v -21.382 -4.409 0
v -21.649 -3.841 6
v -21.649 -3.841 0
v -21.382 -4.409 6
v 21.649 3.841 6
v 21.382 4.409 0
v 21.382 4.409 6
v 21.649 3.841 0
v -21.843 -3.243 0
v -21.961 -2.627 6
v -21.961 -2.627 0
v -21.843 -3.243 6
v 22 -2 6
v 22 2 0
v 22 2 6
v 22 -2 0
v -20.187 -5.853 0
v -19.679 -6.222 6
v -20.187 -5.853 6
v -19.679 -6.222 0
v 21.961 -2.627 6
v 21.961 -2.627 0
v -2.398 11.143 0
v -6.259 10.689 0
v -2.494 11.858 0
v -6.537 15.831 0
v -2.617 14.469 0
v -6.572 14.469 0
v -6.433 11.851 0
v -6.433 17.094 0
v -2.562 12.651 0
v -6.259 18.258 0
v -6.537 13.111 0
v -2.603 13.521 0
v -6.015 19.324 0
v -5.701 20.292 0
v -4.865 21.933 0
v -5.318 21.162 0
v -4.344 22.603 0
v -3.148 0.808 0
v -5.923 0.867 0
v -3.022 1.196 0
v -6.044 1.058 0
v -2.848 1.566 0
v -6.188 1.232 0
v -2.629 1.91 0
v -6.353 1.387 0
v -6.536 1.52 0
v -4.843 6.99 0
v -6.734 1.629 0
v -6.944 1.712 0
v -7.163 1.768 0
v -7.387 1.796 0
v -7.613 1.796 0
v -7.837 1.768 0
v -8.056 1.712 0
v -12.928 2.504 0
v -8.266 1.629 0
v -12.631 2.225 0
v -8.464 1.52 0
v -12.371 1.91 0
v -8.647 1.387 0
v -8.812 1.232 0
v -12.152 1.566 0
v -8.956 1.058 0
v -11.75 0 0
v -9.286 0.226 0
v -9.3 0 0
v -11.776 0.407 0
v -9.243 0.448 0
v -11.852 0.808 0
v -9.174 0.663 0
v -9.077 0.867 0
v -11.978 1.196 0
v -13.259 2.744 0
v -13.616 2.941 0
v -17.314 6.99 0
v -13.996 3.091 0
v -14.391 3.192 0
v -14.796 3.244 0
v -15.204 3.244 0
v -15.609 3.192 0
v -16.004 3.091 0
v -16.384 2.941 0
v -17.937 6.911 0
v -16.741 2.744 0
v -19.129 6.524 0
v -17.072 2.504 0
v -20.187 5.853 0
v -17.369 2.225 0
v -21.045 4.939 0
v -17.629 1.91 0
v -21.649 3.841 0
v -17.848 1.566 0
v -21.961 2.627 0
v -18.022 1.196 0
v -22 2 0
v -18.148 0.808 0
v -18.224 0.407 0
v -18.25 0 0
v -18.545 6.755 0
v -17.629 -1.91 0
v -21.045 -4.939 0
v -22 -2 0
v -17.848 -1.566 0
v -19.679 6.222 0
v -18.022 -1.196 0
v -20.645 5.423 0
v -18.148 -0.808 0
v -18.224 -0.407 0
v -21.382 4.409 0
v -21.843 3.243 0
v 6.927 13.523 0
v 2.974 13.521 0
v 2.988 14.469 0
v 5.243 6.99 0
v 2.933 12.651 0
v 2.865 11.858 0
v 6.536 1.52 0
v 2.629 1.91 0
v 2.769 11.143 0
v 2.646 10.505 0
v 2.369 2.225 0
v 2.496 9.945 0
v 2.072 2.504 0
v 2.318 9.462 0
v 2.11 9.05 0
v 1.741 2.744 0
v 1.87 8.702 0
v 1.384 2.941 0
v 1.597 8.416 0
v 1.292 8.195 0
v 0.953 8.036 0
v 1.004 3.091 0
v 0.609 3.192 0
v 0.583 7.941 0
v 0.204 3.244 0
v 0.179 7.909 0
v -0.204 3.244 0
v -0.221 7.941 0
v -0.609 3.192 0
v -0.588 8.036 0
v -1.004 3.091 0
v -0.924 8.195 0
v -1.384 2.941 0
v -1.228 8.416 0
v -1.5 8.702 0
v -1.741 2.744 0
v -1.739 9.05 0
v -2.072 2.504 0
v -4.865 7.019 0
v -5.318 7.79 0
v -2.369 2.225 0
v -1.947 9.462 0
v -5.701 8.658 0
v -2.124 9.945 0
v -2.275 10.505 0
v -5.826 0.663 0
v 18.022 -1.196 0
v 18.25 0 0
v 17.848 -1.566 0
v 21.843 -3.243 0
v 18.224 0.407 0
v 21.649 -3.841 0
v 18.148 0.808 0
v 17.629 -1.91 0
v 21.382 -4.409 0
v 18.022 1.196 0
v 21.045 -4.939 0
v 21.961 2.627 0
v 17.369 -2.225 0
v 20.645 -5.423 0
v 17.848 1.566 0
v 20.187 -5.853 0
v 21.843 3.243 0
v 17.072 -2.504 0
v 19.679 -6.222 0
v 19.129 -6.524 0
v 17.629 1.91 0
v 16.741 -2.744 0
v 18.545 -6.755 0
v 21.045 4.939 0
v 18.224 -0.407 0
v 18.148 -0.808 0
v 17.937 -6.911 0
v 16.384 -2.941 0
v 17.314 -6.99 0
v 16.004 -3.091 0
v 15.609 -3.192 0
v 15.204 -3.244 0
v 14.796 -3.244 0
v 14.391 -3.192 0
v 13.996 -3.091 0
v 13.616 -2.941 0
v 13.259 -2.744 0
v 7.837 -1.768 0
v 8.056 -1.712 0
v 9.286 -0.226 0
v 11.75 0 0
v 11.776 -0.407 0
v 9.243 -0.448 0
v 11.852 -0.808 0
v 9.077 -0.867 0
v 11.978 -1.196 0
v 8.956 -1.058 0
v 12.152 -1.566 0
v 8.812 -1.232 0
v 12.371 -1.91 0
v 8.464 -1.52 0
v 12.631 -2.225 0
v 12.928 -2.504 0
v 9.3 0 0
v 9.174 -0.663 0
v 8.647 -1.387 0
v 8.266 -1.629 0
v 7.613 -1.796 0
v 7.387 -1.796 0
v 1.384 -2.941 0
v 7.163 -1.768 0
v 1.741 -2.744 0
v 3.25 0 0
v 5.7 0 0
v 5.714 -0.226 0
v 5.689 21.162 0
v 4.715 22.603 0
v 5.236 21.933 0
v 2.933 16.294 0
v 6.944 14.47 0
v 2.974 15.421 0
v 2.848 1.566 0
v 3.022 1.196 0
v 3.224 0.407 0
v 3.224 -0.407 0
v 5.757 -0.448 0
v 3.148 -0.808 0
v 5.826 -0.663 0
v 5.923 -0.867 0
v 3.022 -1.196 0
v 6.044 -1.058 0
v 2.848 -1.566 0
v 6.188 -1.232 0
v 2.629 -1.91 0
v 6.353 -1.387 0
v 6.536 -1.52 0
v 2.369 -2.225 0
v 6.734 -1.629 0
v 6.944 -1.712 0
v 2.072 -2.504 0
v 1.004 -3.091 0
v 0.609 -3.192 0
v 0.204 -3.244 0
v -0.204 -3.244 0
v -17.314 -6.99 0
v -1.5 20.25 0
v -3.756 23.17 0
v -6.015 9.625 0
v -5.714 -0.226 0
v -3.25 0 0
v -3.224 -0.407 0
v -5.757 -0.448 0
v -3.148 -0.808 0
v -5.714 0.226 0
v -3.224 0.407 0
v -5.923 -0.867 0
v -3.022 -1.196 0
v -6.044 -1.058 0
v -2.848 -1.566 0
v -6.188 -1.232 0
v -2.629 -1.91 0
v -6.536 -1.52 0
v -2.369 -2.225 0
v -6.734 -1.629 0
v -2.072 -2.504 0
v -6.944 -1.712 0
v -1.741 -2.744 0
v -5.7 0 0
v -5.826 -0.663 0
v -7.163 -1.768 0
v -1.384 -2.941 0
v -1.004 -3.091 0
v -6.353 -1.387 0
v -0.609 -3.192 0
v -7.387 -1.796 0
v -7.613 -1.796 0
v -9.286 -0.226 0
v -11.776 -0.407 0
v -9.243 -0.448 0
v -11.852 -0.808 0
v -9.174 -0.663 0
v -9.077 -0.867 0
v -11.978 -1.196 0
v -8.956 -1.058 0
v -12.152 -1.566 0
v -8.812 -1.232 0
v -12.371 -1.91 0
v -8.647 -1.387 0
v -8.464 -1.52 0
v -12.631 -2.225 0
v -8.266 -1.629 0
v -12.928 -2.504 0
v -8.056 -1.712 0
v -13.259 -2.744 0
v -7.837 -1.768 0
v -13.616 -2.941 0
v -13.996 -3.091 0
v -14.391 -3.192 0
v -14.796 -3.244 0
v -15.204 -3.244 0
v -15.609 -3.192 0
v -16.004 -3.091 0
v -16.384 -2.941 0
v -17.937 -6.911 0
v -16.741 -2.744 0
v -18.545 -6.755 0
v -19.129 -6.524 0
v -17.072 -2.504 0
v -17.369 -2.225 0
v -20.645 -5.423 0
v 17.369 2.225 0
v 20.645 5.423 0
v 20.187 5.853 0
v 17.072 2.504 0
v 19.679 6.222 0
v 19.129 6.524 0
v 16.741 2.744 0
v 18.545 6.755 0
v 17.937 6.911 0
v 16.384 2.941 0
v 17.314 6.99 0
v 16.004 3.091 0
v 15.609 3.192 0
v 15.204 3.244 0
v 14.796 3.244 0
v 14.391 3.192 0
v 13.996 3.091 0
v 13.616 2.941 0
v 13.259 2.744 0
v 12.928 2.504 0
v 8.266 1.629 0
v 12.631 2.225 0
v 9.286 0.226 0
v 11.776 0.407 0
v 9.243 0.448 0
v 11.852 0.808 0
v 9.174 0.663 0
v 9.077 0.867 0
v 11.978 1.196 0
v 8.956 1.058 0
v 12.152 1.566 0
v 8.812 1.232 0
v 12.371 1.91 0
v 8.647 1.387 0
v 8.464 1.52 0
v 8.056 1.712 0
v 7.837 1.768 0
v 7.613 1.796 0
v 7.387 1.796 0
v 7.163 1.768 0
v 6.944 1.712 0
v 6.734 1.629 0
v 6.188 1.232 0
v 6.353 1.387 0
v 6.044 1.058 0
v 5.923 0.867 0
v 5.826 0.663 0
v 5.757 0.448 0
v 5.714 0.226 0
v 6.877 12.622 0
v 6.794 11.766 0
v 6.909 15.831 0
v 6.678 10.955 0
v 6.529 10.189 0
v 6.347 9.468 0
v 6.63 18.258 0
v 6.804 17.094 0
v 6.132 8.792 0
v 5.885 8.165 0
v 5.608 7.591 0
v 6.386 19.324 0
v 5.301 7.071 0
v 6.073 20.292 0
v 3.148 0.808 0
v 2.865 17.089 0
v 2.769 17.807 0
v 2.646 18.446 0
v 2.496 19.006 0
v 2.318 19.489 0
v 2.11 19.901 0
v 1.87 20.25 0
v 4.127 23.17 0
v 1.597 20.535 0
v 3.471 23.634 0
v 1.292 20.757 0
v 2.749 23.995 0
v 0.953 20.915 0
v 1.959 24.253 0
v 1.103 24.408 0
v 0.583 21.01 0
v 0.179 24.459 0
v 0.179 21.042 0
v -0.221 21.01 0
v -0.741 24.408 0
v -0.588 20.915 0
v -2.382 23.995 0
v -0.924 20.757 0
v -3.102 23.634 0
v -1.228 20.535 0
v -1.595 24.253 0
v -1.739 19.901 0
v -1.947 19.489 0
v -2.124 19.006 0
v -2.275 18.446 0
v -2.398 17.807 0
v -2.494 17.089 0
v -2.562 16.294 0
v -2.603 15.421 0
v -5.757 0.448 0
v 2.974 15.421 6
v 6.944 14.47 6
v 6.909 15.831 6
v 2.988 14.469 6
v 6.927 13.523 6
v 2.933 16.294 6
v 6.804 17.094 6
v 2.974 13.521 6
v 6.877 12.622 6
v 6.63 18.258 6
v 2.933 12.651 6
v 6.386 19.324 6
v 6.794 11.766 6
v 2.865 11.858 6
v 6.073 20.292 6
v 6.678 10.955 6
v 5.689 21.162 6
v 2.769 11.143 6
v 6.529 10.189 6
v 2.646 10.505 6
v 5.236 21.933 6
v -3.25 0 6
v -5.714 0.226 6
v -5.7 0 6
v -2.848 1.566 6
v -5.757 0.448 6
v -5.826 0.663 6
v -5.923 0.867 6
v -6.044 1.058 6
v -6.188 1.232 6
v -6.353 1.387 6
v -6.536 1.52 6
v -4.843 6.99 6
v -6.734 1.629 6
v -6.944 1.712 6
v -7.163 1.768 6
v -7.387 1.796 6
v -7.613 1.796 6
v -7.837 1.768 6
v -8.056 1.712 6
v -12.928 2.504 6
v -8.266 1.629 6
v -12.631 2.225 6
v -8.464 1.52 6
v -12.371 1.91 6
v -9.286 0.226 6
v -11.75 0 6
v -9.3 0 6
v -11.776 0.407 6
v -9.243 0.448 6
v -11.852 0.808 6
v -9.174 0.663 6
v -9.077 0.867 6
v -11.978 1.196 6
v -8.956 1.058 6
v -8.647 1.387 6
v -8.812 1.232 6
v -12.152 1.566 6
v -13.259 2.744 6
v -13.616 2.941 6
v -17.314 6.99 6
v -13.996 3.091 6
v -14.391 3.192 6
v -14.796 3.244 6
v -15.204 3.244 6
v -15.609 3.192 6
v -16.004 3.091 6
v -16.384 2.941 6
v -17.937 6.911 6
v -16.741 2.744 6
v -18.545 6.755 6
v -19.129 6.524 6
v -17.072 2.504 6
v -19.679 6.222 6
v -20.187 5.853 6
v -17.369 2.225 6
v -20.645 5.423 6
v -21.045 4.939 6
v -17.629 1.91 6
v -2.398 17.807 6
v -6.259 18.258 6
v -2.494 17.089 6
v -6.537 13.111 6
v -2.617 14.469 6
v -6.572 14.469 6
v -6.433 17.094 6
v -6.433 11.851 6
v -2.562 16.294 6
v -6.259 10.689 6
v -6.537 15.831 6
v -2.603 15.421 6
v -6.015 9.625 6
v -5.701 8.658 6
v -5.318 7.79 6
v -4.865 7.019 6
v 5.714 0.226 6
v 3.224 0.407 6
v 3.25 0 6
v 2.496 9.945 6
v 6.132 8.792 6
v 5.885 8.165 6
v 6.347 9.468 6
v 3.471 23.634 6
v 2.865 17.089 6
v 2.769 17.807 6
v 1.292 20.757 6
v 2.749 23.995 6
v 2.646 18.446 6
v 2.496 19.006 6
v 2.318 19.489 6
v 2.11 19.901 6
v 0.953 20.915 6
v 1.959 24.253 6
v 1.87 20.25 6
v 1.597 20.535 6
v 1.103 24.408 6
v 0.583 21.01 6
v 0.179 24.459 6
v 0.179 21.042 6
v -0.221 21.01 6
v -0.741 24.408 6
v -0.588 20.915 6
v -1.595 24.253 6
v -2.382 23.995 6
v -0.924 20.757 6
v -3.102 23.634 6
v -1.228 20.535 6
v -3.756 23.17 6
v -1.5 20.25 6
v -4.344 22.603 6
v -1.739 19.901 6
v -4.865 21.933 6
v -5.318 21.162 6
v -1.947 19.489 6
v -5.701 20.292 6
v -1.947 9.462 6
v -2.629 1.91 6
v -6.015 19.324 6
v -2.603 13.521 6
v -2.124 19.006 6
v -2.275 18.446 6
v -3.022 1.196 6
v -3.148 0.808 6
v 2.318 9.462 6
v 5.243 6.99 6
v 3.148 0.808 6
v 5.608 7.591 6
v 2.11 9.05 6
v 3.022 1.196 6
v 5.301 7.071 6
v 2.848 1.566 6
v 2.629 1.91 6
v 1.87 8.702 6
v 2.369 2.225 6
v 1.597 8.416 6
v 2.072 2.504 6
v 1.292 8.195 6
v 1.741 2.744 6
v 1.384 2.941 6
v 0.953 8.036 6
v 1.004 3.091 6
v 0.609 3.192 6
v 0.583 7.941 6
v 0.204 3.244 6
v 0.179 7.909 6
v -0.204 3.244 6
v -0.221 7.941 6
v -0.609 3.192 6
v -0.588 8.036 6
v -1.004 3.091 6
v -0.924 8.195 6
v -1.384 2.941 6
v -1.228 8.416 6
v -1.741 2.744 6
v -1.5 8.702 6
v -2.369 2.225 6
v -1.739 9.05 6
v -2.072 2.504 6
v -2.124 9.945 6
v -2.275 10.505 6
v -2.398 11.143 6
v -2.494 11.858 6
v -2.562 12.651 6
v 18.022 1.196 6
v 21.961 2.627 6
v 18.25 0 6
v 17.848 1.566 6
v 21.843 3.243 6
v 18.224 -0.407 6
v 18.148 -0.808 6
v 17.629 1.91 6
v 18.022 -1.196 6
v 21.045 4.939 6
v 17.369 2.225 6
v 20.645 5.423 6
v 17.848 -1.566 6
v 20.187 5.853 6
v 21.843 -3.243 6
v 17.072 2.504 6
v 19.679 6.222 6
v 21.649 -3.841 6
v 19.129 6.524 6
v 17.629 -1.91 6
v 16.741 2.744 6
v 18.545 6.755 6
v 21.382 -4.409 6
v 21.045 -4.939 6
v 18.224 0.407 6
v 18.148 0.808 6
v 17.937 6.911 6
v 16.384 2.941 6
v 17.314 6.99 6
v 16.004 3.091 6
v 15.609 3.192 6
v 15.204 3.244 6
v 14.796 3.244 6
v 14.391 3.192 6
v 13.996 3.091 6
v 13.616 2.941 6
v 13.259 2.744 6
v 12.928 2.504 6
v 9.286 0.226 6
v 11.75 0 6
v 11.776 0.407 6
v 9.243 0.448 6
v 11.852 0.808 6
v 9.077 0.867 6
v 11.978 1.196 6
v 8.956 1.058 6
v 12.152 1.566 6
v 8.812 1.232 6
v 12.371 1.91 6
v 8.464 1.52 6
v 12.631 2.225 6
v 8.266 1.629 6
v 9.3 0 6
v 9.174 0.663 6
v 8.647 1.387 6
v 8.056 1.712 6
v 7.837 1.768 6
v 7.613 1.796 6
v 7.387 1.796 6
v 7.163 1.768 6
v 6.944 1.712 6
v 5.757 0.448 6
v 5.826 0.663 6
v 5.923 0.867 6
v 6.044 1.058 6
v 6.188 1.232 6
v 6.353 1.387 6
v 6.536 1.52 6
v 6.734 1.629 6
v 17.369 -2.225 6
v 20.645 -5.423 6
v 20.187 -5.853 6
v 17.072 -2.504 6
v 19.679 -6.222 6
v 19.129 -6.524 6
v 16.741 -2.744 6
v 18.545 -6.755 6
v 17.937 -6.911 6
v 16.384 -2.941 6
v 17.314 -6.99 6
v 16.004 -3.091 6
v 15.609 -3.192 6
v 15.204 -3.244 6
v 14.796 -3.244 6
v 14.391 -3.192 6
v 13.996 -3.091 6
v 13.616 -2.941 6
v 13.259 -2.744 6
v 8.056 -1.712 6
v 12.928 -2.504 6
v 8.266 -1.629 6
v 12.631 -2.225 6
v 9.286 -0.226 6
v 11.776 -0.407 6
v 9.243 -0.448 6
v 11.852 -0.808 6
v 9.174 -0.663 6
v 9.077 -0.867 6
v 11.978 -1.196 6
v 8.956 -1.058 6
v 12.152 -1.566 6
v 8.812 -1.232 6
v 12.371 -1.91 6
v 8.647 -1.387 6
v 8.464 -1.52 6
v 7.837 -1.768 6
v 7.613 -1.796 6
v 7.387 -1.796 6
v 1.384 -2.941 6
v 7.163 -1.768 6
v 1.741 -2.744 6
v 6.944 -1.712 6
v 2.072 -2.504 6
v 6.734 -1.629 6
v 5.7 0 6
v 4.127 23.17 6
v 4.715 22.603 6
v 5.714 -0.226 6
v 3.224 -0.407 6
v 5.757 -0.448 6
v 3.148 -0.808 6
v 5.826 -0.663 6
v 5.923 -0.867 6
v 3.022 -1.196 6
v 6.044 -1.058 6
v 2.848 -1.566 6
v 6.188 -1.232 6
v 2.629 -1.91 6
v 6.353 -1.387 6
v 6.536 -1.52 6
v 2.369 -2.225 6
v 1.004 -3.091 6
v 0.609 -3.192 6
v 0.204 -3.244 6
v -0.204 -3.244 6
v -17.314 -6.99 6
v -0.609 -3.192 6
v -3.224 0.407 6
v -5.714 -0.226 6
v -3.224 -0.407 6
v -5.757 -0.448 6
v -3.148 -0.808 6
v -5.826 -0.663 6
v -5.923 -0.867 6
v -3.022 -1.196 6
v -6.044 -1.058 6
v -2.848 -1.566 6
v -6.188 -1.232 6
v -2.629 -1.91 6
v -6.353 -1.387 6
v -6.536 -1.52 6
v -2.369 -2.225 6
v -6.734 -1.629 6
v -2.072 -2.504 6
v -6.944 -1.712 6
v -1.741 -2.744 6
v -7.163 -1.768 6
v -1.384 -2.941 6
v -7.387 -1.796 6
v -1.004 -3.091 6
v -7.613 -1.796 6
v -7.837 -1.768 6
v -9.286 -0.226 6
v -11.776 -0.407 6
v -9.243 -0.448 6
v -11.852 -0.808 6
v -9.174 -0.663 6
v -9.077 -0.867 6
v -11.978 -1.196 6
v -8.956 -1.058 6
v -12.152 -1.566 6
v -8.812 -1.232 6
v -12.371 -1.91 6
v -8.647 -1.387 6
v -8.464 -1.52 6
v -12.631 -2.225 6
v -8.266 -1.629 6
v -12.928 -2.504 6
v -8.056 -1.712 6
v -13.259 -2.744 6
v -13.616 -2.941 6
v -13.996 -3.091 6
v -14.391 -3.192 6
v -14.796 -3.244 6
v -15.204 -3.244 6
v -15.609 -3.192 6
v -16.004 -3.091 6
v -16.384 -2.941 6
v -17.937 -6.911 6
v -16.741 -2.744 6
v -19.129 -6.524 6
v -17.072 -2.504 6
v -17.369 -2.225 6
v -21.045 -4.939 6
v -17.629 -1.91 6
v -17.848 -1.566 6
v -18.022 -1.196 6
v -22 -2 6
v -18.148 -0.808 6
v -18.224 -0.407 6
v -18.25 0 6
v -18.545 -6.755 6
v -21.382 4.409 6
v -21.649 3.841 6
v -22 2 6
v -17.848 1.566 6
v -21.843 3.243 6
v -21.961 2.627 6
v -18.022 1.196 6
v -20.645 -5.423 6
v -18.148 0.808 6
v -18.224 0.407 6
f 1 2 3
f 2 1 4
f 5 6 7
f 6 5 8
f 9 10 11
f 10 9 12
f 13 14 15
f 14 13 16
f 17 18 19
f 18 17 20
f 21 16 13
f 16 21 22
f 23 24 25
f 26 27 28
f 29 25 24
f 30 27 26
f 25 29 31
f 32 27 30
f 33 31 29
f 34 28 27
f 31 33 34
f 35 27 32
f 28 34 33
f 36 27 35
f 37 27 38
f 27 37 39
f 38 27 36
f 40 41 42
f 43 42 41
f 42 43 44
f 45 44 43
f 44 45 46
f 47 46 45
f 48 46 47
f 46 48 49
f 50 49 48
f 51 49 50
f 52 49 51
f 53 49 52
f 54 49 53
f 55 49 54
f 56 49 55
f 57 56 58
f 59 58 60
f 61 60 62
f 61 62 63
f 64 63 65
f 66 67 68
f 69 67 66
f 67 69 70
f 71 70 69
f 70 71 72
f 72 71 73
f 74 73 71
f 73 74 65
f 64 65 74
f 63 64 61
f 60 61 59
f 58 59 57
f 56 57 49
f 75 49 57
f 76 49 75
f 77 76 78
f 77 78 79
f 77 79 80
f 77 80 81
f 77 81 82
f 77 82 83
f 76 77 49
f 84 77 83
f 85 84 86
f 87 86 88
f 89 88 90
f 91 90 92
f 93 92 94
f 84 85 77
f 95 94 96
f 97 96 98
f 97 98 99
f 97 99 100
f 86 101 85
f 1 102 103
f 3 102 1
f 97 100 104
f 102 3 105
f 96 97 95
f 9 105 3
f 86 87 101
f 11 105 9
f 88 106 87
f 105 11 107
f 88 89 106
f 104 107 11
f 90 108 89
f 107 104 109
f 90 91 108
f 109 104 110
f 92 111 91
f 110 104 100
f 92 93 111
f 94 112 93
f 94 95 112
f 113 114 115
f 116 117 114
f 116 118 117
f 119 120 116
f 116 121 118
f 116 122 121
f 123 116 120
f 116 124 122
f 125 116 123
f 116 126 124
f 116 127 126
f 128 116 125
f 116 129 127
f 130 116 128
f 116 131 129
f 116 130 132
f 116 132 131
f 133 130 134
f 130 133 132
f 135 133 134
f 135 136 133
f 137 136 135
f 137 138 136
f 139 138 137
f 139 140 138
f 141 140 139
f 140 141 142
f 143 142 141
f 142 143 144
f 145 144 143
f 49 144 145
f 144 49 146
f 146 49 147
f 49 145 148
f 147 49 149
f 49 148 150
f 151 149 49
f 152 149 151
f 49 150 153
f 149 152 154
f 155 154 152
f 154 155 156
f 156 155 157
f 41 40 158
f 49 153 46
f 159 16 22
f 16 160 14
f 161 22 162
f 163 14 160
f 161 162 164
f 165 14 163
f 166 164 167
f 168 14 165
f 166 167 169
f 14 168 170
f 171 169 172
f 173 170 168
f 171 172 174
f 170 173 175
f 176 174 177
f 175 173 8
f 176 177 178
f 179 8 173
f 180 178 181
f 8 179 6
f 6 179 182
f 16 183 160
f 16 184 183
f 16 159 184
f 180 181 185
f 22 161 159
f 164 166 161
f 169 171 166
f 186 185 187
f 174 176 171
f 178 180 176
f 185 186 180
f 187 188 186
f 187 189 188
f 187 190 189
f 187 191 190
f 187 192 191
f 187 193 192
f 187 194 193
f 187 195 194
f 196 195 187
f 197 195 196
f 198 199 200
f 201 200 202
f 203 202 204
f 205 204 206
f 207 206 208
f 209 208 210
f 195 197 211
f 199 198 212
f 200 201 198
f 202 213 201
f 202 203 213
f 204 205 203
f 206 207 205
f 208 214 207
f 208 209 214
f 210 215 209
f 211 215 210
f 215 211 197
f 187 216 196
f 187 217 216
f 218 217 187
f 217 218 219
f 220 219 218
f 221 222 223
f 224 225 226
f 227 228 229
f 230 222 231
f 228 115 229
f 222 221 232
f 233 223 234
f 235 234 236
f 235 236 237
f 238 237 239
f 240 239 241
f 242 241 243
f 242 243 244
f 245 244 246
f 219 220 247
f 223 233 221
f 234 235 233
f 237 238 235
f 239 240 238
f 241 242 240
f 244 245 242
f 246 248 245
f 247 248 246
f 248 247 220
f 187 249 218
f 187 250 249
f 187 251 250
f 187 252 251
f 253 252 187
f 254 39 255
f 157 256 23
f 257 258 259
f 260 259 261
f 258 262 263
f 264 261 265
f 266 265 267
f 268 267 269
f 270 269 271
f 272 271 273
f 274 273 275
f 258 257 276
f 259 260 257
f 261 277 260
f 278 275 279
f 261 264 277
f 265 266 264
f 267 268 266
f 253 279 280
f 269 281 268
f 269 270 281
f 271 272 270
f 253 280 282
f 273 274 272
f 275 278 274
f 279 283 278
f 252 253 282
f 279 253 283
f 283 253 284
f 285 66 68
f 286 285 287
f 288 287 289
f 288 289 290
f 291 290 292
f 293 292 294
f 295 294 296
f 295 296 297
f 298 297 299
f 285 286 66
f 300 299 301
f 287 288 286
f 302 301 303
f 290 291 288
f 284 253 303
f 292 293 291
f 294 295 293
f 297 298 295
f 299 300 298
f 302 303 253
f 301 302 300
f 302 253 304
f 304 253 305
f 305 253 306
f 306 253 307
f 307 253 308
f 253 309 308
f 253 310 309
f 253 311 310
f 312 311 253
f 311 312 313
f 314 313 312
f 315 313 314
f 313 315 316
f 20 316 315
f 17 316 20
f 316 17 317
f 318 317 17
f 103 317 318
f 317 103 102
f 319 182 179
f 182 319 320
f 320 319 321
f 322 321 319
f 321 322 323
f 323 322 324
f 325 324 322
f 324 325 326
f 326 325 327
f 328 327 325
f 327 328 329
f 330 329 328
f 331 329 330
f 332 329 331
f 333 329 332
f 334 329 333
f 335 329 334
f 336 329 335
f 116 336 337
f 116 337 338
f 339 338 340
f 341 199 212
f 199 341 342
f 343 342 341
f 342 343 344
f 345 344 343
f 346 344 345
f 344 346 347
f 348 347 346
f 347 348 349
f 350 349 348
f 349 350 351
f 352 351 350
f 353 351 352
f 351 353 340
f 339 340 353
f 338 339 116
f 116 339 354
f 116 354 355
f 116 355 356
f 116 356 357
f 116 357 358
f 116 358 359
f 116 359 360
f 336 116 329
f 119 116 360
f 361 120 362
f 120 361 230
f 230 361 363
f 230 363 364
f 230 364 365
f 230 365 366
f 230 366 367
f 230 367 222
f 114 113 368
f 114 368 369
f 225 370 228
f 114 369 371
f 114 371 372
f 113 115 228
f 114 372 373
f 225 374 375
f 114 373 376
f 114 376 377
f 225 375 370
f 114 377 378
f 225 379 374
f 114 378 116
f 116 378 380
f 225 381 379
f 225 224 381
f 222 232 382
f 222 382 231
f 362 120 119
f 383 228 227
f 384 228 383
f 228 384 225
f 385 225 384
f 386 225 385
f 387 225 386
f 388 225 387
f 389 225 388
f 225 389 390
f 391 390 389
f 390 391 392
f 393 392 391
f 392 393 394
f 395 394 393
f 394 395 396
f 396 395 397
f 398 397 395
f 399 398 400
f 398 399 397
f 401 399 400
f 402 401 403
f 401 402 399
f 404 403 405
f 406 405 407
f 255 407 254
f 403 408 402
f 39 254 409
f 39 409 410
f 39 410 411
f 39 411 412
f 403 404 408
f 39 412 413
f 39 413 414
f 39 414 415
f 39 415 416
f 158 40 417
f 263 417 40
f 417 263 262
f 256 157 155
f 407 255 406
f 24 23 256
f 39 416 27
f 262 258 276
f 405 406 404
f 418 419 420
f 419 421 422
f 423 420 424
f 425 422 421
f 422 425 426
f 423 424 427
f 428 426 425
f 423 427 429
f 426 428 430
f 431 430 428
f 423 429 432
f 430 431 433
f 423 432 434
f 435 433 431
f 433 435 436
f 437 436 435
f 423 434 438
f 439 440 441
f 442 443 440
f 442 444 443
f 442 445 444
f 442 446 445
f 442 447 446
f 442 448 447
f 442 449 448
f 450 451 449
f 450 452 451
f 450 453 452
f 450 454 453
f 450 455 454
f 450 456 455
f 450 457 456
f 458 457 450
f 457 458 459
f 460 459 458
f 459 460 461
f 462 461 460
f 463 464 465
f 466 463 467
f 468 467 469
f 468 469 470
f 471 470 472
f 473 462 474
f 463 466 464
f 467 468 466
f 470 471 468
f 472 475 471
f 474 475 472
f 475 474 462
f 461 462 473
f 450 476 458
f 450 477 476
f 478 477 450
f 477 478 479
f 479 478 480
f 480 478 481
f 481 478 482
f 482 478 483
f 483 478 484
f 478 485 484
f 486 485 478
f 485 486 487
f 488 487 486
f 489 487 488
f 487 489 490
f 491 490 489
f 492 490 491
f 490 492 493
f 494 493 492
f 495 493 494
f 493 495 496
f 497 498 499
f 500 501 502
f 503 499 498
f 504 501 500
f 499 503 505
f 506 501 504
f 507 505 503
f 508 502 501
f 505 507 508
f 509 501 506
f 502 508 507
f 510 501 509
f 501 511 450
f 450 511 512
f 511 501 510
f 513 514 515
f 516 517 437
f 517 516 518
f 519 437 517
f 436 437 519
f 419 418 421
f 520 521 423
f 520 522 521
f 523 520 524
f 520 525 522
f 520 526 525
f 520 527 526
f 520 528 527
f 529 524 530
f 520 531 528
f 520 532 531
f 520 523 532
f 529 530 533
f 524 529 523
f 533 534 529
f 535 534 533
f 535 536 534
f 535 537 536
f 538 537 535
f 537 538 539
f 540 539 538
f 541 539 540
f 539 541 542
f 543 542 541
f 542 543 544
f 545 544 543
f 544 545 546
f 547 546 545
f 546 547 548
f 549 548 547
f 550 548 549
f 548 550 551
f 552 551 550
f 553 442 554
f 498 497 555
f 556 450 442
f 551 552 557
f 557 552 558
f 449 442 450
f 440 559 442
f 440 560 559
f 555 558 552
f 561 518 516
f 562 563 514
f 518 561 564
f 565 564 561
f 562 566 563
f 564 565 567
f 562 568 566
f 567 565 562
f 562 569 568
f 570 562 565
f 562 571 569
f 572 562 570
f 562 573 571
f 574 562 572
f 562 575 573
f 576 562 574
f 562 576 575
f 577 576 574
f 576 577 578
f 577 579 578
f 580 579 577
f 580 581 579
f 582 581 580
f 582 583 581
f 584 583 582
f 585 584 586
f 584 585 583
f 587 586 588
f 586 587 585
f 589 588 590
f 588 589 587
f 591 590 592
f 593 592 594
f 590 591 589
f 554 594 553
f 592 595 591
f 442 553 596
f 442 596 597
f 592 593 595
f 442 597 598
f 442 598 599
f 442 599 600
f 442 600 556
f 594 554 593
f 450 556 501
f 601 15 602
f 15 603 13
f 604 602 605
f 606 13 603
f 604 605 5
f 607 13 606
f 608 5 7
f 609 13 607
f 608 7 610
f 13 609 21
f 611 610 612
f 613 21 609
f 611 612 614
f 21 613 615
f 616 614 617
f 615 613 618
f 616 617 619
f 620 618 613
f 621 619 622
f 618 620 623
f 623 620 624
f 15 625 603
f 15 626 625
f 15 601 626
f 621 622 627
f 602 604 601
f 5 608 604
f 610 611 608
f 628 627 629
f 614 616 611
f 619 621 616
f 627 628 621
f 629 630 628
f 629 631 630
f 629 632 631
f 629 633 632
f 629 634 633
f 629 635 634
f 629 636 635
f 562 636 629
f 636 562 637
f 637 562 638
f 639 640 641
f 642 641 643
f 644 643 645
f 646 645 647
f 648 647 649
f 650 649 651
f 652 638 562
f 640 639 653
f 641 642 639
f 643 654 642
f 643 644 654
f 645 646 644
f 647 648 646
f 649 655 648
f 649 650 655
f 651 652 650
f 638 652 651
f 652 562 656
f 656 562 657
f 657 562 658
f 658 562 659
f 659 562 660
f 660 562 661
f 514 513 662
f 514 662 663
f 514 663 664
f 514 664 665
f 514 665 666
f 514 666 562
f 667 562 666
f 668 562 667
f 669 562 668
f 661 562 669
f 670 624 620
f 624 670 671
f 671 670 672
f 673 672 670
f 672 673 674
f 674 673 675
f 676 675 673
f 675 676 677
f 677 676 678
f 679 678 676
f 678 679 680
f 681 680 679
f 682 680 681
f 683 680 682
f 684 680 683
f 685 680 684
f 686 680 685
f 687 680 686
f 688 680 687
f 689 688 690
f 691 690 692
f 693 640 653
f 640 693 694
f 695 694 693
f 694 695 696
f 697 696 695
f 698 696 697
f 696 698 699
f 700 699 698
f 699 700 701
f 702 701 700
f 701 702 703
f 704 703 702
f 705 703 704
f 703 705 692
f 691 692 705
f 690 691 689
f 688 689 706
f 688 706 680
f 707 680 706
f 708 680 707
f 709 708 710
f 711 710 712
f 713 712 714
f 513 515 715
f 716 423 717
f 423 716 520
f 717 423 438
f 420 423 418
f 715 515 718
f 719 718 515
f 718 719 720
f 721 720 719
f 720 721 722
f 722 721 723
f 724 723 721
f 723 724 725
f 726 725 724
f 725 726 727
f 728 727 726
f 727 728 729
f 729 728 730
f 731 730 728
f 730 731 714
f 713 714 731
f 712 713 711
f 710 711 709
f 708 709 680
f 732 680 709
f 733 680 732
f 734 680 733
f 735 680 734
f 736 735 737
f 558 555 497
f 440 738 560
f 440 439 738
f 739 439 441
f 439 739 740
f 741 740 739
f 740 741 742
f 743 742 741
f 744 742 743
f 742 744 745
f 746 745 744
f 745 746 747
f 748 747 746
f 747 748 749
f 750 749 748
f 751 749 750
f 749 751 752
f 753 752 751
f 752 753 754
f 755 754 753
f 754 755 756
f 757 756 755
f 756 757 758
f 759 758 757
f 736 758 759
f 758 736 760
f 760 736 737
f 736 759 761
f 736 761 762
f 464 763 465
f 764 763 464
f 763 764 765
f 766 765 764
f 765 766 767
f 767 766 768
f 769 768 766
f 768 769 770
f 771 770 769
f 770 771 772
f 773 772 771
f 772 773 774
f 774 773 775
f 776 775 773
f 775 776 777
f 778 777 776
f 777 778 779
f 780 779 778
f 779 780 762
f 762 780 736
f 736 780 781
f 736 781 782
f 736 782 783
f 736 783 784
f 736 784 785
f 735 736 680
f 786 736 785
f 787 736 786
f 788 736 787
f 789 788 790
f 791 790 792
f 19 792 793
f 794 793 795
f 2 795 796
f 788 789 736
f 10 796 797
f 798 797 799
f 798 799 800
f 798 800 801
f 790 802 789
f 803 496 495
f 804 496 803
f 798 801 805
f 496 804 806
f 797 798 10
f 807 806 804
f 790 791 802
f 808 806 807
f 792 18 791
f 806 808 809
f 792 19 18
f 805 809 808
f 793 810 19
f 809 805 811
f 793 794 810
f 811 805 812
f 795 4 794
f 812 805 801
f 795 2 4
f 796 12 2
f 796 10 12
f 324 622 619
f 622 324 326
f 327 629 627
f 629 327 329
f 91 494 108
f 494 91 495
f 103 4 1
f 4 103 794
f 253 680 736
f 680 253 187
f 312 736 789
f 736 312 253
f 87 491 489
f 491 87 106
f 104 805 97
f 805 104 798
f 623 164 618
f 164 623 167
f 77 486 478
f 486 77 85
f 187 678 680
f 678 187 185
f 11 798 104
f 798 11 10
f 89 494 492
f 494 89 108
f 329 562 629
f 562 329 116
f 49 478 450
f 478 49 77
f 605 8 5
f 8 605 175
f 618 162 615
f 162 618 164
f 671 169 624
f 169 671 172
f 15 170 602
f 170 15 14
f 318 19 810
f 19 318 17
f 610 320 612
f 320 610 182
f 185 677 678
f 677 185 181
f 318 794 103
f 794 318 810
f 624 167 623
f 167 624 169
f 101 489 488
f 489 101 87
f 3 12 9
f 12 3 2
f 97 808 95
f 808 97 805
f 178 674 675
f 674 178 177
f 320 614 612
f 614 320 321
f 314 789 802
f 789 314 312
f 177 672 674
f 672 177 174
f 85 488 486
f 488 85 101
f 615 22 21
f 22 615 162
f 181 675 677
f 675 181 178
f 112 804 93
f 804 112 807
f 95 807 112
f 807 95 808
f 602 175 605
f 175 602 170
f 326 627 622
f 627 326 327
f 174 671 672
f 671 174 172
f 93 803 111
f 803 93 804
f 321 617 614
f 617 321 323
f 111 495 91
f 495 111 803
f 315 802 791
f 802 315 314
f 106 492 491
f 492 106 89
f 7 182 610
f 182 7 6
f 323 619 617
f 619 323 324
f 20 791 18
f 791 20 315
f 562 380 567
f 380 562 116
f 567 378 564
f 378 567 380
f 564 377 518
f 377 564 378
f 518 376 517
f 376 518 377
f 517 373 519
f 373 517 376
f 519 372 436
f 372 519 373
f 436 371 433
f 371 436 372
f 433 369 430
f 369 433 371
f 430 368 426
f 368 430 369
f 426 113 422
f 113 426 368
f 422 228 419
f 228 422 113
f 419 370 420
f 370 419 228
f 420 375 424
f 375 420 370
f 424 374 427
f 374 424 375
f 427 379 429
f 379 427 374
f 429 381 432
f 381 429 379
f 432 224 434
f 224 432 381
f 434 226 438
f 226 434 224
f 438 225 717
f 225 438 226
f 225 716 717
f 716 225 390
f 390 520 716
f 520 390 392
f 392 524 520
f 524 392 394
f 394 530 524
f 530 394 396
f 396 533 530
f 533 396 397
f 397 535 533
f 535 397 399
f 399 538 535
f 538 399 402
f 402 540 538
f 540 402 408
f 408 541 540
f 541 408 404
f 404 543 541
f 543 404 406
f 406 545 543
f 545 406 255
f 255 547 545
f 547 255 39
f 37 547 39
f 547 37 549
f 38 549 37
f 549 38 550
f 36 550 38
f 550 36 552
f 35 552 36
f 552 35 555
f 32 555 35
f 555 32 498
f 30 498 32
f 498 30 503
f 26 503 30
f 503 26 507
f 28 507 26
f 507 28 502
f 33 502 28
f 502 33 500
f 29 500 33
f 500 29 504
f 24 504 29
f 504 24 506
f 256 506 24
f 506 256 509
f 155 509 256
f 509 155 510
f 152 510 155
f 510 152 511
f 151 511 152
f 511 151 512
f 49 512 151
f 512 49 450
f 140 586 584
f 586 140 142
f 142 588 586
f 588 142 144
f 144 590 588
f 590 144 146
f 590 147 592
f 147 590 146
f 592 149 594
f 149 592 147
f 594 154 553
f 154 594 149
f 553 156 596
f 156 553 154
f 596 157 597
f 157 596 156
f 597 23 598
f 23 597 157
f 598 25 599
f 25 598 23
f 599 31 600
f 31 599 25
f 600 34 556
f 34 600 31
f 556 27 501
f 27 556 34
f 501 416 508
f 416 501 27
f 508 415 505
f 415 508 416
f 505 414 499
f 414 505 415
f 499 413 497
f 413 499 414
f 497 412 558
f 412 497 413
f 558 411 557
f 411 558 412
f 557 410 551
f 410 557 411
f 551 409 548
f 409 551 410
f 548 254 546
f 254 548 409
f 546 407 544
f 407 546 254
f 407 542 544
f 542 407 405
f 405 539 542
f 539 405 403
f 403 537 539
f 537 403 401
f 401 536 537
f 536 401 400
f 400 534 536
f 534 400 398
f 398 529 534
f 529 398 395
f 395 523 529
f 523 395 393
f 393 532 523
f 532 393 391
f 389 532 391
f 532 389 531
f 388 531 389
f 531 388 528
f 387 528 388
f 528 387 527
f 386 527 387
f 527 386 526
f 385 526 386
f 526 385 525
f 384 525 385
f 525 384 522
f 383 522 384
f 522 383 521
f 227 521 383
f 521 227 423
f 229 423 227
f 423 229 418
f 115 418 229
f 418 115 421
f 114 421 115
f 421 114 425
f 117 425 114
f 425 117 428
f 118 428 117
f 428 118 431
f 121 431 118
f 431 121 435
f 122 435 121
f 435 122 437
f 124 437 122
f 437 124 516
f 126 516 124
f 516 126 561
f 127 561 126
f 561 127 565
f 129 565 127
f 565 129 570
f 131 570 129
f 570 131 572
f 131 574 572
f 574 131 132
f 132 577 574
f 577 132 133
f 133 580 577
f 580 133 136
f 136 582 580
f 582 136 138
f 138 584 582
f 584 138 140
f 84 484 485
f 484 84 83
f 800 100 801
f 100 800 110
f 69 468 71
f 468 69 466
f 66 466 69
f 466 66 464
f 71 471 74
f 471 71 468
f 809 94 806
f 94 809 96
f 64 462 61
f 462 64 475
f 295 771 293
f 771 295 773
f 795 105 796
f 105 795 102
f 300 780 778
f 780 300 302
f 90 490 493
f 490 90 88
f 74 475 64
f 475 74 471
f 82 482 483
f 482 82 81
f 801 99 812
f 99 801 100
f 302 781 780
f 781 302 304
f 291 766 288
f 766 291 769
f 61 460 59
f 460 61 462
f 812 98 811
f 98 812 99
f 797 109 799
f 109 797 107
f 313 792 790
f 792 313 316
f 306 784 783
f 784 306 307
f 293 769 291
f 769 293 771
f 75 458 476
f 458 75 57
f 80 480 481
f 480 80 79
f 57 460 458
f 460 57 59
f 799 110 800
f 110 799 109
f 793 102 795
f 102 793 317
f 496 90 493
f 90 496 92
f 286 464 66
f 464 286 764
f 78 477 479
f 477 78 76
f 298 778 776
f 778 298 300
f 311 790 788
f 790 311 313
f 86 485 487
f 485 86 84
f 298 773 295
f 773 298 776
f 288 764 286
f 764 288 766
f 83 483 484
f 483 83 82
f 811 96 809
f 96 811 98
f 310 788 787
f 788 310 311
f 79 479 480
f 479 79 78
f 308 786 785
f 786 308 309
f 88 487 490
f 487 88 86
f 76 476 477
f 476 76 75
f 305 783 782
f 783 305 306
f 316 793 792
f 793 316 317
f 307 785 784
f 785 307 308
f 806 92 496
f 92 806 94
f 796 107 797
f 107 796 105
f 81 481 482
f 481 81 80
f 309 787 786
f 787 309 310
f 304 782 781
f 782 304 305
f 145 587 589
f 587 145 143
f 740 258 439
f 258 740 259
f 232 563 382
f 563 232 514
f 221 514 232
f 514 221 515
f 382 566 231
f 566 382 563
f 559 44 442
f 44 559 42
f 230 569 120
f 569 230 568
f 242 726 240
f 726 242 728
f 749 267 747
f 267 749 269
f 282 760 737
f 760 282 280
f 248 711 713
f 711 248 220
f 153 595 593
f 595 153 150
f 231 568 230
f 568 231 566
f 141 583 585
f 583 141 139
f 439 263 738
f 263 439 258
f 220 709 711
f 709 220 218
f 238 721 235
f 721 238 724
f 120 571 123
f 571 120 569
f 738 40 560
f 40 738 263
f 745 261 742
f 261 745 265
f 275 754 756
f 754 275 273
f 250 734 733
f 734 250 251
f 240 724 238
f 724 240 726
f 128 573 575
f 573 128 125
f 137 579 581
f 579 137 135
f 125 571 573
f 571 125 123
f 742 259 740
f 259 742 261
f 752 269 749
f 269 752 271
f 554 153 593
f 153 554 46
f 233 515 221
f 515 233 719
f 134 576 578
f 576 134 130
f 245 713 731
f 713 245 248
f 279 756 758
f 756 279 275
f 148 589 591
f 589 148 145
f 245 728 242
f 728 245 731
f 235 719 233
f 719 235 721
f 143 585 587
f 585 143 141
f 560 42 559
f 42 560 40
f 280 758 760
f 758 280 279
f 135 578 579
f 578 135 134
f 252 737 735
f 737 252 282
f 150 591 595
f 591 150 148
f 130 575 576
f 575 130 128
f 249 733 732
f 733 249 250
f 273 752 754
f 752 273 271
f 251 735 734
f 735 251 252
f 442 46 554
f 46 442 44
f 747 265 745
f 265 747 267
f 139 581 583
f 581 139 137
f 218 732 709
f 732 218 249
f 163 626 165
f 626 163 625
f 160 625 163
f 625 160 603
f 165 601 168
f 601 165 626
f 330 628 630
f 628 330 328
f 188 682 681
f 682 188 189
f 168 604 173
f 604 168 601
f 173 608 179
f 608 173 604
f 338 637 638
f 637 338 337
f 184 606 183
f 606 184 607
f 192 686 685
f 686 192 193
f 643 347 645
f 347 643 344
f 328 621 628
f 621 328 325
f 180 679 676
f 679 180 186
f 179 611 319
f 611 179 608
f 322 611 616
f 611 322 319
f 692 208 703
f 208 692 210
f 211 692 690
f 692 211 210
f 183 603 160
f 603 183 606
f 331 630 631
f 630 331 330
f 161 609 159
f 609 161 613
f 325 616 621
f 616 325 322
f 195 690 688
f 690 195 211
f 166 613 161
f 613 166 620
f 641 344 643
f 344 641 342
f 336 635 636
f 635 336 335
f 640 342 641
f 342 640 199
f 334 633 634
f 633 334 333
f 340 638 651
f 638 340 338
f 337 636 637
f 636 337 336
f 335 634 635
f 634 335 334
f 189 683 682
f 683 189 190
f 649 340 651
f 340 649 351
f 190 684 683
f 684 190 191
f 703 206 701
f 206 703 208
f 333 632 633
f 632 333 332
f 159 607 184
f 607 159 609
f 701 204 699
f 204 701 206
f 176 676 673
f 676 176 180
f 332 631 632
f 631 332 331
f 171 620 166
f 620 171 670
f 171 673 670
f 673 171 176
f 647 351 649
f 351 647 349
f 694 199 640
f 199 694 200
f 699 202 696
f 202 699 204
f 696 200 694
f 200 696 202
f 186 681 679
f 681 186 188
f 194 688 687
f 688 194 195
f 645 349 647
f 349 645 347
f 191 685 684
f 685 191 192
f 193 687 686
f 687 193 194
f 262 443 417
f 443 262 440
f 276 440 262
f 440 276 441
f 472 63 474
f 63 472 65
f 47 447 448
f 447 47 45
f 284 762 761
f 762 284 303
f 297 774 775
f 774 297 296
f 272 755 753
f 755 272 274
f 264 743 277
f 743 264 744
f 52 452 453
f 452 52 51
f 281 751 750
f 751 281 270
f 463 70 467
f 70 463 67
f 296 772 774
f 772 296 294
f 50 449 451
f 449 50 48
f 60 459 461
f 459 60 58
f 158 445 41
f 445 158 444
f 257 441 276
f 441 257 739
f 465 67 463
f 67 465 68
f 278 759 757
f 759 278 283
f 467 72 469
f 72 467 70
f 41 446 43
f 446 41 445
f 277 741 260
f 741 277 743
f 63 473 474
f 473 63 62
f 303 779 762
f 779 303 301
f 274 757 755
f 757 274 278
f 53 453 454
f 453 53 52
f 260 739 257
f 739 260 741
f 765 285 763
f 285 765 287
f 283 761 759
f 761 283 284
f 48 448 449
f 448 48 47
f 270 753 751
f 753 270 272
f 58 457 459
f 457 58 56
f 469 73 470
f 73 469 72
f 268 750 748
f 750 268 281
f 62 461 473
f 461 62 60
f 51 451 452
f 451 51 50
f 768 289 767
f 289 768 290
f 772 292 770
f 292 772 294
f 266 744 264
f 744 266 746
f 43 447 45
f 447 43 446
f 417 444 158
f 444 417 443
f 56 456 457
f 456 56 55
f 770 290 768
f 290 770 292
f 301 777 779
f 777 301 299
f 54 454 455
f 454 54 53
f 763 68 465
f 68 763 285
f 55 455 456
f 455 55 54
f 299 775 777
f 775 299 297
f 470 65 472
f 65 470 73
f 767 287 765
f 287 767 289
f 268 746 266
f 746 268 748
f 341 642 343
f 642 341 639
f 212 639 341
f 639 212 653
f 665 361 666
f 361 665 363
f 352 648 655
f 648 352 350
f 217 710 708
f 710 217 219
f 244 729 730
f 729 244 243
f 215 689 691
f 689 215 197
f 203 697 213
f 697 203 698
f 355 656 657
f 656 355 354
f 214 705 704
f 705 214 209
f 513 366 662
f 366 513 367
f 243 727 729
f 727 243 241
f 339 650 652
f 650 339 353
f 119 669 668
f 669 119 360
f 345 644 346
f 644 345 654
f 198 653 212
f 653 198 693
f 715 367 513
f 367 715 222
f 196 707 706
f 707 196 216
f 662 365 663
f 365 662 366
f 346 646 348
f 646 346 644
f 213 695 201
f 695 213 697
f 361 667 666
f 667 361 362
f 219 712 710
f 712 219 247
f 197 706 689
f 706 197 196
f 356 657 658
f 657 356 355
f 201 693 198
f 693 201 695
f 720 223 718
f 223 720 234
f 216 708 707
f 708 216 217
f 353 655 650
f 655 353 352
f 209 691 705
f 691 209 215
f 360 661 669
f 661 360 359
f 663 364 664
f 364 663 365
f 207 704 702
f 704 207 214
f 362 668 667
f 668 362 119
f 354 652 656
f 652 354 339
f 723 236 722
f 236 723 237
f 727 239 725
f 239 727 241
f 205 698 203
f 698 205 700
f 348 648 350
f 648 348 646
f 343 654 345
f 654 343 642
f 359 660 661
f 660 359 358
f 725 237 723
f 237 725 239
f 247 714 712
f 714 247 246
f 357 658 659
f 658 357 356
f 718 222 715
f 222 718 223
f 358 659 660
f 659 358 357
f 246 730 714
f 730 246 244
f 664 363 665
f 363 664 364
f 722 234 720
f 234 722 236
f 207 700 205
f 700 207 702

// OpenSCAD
$fn = 50;


difference() {
	union() {
		hull() {
			translate(v = [-17.0000000000, 2.0000000000, 0]) {
				cylinder(h = 6, r = 5);
			}
			translate(v = [17.0000000000, 2.0000000000, 0]) {
				cylinder(h = 6, r = 5);
			}
			translate(v = [-17.0000000000, -2.0000000000, 0]) {
				cylinder(h = 6, r = 5);
			}
			translate(v = [17.0000000000, -2.0000000000, 0]) {
				cylinder(h = 6, r = 5);
			}
		}
		translate(v = [0, 24, 0]) {
			linear_extrude(height = 6) {
				text(font = "DejaVu Sans Mono:style=Bold", halign = "center", size = 19.0000000000, text = "Q", valign = "top");
			}
		}
	}
	union() {
		translate(v = [-15.0000000000, 0.0000000000, 0]) {
			translate(v = [0, 0, -100]) {
				cylinder(h = 200, r = 3.2500000000);
			}
		}
		translate(v = [0, 0, -100]) {
			cylinder(h = 200, r = 3.2500000000);
		}
		translate(v = [15.0000000000, 0.0000000000, 0]) {
			translate(v = [0, 0, -100]) {
				cylinder(h = 200, r = 3.2500000000);
			}
		}
		translate(v = [-15.0000000000, 0.0000000000, 0]) {
			translate(v = [0, 0, -100]) {
				cylinder(h = 200, r = 1.8000000000);
			}
		}
		translate(v = [-7.5000000000, 0.0000000000, 0]) {
			translate(v = [0, 0, -100]) {
				cylinder(h = 200, r = 1.8000000000);
			}
		}
		translate(v = [0, 0, -100]) {
			cylinder(h = 200, r = 1.8000000000);
		}
		translate(v = [7.5000000000, 0.0000000000, 0]) {
			translate(v = [0, 0, -100]) {
				cylinder(h = 200, r = 1.8000000000);
			}
		}
		translate(v = [15.0000000000, 0.0000000000, 0]) {
			translate(v = [0, 0, -100]) {
				cylinder(h = 200, r = 1.8000000000);
			}
		}
	}
}
